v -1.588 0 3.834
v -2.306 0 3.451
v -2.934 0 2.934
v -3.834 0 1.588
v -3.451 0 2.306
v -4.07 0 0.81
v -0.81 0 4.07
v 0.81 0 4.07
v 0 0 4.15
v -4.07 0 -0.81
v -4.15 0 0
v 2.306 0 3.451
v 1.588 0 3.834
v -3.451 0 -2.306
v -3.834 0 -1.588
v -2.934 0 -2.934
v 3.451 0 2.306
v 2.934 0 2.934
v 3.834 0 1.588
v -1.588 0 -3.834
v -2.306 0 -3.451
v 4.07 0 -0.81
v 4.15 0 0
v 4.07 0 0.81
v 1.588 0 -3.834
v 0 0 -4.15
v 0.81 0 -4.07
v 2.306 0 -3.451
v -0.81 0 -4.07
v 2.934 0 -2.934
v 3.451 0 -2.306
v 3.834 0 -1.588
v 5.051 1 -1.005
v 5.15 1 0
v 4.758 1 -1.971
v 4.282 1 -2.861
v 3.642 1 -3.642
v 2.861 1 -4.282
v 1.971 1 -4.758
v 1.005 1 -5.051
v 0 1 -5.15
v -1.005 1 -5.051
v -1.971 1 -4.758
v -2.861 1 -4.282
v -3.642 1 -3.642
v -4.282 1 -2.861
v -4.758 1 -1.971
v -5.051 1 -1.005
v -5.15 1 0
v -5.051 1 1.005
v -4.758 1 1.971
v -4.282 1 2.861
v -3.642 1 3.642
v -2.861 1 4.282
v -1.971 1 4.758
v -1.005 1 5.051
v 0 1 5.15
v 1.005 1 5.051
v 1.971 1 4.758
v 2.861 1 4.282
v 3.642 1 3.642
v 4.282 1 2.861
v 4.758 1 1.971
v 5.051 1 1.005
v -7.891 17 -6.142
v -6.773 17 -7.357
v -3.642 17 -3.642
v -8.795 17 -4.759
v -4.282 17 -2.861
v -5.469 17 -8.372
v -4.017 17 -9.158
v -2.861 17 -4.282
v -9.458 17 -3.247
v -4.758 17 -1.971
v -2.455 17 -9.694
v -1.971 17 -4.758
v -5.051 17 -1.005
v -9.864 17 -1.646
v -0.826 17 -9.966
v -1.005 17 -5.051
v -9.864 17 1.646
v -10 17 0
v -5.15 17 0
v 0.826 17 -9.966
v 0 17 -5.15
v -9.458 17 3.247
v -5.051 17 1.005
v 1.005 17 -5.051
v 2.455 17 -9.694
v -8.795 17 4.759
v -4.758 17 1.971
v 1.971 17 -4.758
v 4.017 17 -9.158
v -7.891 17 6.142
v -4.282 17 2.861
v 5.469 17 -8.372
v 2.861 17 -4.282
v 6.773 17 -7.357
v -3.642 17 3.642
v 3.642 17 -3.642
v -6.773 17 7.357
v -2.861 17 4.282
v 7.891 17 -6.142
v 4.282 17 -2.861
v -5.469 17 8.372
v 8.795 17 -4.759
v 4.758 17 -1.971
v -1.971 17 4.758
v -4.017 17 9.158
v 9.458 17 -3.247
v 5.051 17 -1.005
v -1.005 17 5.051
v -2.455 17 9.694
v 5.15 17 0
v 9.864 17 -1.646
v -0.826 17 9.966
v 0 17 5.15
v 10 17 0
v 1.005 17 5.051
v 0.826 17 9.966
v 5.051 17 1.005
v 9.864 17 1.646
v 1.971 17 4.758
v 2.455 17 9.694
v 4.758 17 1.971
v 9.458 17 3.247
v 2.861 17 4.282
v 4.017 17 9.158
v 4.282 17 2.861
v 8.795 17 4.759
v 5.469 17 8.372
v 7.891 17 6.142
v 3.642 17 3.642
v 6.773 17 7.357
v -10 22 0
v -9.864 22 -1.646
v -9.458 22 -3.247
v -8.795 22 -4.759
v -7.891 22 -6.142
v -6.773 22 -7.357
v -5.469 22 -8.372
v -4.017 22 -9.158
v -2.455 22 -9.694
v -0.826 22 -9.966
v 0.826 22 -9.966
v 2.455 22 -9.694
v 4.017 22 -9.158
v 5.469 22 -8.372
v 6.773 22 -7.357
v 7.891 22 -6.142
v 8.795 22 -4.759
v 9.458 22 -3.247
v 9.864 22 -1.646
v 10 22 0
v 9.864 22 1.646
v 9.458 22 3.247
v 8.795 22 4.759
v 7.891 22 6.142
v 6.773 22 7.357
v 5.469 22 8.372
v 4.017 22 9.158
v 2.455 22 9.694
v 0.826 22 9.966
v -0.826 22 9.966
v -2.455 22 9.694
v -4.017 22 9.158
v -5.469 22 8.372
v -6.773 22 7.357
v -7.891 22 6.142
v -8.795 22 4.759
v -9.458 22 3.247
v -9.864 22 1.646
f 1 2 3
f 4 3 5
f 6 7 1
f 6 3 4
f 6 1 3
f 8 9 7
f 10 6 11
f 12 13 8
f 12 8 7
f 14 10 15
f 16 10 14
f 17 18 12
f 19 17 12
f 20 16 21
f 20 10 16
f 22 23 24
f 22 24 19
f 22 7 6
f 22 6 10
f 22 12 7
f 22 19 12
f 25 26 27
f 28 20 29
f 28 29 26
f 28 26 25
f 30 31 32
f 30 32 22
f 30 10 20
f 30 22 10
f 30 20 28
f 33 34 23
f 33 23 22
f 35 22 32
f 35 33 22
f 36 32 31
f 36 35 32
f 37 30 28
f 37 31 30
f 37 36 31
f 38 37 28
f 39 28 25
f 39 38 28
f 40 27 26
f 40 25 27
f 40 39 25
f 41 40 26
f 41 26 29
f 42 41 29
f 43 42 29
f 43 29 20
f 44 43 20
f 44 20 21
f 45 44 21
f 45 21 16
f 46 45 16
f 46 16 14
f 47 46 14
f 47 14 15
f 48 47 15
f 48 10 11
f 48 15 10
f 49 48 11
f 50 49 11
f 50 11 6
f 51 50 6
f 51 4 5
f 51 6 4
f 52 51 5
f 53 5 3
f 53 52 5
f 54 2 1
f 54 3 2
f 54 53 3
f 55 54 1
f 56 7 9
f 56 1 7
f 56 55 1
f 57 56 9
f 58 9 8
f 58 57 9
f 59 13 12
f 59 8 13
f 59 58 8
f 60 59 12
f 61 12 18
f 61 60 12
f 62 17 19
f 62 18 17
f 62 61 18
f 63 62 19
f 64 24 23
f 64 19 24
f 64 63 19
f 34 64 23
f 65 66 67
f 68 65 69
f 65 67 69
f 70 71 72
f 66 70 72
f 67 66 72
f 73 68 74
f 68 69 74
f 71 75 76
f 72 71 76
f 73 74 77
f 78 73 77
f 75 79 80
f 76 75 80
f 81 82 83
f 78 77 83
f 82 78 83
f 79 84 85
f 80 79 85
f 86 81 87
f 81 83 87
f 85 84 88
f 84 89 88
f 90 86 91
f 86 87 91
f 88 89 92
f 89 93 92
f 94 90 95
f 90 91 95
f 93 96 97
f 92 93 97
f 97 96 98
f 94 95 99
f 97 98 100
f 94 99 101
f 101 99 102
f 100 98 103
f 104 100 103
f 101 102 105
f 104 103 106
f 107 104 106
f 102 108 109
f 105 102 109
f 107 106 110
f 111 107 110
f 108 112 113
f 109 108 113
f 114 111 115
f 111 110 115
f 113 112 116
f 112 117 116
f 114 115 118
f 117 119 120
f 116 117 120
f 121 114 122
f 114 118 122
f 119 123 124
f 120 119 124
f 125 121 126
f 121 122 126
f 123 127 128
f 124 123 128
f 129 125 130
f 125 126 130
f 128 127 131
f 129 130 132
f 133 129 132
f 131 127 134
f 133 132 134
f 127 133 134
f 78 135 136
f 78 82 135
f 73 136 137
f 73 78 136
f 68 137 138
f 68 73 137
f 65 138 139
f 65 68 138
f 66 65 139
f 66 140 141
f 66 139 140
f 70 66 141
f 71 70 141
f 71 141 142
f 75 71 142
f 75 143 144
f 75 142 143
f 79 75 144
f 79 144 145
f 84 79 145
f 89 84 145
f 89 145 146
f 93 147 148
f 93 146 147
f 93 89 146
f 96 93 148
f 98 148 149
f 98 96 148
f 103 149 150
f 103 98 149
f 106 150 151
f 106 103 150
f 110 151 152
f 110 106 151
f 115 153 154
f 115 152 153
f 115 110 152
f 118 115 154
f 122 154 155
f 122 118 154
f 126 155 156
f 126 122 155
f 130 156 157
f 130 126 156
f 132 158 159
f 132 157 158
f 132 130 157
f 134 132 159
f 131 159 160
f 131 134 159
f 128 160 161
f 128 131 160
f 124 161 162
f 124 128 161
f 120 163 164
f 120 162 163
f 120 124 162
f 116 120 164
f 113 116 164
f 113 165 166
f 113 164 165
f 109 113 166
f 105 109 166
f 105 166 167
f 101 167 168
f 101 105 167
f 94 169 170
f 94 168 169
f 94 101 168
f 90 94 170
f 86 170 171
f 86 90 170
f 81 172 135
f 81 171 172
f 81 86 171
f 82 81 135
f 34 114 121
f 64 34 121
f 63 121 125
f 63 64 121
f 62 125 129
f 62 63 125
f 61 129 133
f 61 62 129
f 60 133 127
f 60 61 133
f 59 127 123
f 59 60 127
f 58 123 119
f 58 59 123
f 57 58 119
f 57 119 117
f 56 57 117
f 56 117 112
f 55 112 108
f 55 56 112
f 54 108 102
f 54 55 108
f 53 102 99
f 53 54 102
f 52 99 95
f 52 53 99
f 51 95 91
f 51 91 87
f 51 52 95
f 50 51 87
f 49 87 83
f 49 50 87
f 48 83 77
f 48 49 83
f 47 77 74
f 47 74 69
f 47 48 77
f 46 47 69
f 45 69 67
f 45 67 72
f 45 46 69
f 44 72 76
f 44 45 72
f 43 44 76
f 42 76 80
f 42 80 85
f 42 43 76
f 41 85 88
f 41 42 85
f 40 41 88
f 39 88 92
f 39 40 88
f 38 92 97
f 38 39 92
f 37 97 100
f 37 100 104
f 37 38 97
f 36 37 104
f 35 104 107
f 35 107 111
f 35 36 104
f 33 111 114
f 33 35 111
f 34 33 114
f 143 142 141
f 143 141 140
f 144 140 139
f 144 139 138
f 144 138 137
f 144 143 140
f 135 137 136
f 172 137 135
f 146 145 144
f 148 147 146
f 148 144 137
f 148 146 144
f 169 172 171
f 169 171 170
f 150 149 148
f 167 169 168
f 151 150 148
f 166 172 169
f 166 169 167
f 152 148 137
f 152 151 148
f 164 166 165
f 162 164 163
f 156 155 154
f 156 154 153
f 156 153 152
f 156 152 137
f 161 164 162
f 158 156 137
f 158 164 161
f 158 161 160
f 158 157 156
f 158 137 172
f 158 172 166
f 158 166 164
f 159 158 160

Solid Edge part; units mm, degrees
sketch "Sketch1" plane through (0, 0, 0) normal (0, -1, 0) x (1, 0, 0)
  circle A0 centre (0, 0) radius 5.15
  dimension "D1" = 10.3
extrude "Protrusion1" add sketch "Sketch1" against normal blind 17
chamfer "Fase_1" distance 1 angle 45 1 edges at (-5.15, 0, 0)
sketch "Sketch2" plane through (0, 17, 0) normal (0, 1, 0) x (-1, 0, 0)
  circle A0 centre (0, 0) radius 10
extrude "Extrusionsausprägung_2" add sketch "Sketch2" along normal blind 5
